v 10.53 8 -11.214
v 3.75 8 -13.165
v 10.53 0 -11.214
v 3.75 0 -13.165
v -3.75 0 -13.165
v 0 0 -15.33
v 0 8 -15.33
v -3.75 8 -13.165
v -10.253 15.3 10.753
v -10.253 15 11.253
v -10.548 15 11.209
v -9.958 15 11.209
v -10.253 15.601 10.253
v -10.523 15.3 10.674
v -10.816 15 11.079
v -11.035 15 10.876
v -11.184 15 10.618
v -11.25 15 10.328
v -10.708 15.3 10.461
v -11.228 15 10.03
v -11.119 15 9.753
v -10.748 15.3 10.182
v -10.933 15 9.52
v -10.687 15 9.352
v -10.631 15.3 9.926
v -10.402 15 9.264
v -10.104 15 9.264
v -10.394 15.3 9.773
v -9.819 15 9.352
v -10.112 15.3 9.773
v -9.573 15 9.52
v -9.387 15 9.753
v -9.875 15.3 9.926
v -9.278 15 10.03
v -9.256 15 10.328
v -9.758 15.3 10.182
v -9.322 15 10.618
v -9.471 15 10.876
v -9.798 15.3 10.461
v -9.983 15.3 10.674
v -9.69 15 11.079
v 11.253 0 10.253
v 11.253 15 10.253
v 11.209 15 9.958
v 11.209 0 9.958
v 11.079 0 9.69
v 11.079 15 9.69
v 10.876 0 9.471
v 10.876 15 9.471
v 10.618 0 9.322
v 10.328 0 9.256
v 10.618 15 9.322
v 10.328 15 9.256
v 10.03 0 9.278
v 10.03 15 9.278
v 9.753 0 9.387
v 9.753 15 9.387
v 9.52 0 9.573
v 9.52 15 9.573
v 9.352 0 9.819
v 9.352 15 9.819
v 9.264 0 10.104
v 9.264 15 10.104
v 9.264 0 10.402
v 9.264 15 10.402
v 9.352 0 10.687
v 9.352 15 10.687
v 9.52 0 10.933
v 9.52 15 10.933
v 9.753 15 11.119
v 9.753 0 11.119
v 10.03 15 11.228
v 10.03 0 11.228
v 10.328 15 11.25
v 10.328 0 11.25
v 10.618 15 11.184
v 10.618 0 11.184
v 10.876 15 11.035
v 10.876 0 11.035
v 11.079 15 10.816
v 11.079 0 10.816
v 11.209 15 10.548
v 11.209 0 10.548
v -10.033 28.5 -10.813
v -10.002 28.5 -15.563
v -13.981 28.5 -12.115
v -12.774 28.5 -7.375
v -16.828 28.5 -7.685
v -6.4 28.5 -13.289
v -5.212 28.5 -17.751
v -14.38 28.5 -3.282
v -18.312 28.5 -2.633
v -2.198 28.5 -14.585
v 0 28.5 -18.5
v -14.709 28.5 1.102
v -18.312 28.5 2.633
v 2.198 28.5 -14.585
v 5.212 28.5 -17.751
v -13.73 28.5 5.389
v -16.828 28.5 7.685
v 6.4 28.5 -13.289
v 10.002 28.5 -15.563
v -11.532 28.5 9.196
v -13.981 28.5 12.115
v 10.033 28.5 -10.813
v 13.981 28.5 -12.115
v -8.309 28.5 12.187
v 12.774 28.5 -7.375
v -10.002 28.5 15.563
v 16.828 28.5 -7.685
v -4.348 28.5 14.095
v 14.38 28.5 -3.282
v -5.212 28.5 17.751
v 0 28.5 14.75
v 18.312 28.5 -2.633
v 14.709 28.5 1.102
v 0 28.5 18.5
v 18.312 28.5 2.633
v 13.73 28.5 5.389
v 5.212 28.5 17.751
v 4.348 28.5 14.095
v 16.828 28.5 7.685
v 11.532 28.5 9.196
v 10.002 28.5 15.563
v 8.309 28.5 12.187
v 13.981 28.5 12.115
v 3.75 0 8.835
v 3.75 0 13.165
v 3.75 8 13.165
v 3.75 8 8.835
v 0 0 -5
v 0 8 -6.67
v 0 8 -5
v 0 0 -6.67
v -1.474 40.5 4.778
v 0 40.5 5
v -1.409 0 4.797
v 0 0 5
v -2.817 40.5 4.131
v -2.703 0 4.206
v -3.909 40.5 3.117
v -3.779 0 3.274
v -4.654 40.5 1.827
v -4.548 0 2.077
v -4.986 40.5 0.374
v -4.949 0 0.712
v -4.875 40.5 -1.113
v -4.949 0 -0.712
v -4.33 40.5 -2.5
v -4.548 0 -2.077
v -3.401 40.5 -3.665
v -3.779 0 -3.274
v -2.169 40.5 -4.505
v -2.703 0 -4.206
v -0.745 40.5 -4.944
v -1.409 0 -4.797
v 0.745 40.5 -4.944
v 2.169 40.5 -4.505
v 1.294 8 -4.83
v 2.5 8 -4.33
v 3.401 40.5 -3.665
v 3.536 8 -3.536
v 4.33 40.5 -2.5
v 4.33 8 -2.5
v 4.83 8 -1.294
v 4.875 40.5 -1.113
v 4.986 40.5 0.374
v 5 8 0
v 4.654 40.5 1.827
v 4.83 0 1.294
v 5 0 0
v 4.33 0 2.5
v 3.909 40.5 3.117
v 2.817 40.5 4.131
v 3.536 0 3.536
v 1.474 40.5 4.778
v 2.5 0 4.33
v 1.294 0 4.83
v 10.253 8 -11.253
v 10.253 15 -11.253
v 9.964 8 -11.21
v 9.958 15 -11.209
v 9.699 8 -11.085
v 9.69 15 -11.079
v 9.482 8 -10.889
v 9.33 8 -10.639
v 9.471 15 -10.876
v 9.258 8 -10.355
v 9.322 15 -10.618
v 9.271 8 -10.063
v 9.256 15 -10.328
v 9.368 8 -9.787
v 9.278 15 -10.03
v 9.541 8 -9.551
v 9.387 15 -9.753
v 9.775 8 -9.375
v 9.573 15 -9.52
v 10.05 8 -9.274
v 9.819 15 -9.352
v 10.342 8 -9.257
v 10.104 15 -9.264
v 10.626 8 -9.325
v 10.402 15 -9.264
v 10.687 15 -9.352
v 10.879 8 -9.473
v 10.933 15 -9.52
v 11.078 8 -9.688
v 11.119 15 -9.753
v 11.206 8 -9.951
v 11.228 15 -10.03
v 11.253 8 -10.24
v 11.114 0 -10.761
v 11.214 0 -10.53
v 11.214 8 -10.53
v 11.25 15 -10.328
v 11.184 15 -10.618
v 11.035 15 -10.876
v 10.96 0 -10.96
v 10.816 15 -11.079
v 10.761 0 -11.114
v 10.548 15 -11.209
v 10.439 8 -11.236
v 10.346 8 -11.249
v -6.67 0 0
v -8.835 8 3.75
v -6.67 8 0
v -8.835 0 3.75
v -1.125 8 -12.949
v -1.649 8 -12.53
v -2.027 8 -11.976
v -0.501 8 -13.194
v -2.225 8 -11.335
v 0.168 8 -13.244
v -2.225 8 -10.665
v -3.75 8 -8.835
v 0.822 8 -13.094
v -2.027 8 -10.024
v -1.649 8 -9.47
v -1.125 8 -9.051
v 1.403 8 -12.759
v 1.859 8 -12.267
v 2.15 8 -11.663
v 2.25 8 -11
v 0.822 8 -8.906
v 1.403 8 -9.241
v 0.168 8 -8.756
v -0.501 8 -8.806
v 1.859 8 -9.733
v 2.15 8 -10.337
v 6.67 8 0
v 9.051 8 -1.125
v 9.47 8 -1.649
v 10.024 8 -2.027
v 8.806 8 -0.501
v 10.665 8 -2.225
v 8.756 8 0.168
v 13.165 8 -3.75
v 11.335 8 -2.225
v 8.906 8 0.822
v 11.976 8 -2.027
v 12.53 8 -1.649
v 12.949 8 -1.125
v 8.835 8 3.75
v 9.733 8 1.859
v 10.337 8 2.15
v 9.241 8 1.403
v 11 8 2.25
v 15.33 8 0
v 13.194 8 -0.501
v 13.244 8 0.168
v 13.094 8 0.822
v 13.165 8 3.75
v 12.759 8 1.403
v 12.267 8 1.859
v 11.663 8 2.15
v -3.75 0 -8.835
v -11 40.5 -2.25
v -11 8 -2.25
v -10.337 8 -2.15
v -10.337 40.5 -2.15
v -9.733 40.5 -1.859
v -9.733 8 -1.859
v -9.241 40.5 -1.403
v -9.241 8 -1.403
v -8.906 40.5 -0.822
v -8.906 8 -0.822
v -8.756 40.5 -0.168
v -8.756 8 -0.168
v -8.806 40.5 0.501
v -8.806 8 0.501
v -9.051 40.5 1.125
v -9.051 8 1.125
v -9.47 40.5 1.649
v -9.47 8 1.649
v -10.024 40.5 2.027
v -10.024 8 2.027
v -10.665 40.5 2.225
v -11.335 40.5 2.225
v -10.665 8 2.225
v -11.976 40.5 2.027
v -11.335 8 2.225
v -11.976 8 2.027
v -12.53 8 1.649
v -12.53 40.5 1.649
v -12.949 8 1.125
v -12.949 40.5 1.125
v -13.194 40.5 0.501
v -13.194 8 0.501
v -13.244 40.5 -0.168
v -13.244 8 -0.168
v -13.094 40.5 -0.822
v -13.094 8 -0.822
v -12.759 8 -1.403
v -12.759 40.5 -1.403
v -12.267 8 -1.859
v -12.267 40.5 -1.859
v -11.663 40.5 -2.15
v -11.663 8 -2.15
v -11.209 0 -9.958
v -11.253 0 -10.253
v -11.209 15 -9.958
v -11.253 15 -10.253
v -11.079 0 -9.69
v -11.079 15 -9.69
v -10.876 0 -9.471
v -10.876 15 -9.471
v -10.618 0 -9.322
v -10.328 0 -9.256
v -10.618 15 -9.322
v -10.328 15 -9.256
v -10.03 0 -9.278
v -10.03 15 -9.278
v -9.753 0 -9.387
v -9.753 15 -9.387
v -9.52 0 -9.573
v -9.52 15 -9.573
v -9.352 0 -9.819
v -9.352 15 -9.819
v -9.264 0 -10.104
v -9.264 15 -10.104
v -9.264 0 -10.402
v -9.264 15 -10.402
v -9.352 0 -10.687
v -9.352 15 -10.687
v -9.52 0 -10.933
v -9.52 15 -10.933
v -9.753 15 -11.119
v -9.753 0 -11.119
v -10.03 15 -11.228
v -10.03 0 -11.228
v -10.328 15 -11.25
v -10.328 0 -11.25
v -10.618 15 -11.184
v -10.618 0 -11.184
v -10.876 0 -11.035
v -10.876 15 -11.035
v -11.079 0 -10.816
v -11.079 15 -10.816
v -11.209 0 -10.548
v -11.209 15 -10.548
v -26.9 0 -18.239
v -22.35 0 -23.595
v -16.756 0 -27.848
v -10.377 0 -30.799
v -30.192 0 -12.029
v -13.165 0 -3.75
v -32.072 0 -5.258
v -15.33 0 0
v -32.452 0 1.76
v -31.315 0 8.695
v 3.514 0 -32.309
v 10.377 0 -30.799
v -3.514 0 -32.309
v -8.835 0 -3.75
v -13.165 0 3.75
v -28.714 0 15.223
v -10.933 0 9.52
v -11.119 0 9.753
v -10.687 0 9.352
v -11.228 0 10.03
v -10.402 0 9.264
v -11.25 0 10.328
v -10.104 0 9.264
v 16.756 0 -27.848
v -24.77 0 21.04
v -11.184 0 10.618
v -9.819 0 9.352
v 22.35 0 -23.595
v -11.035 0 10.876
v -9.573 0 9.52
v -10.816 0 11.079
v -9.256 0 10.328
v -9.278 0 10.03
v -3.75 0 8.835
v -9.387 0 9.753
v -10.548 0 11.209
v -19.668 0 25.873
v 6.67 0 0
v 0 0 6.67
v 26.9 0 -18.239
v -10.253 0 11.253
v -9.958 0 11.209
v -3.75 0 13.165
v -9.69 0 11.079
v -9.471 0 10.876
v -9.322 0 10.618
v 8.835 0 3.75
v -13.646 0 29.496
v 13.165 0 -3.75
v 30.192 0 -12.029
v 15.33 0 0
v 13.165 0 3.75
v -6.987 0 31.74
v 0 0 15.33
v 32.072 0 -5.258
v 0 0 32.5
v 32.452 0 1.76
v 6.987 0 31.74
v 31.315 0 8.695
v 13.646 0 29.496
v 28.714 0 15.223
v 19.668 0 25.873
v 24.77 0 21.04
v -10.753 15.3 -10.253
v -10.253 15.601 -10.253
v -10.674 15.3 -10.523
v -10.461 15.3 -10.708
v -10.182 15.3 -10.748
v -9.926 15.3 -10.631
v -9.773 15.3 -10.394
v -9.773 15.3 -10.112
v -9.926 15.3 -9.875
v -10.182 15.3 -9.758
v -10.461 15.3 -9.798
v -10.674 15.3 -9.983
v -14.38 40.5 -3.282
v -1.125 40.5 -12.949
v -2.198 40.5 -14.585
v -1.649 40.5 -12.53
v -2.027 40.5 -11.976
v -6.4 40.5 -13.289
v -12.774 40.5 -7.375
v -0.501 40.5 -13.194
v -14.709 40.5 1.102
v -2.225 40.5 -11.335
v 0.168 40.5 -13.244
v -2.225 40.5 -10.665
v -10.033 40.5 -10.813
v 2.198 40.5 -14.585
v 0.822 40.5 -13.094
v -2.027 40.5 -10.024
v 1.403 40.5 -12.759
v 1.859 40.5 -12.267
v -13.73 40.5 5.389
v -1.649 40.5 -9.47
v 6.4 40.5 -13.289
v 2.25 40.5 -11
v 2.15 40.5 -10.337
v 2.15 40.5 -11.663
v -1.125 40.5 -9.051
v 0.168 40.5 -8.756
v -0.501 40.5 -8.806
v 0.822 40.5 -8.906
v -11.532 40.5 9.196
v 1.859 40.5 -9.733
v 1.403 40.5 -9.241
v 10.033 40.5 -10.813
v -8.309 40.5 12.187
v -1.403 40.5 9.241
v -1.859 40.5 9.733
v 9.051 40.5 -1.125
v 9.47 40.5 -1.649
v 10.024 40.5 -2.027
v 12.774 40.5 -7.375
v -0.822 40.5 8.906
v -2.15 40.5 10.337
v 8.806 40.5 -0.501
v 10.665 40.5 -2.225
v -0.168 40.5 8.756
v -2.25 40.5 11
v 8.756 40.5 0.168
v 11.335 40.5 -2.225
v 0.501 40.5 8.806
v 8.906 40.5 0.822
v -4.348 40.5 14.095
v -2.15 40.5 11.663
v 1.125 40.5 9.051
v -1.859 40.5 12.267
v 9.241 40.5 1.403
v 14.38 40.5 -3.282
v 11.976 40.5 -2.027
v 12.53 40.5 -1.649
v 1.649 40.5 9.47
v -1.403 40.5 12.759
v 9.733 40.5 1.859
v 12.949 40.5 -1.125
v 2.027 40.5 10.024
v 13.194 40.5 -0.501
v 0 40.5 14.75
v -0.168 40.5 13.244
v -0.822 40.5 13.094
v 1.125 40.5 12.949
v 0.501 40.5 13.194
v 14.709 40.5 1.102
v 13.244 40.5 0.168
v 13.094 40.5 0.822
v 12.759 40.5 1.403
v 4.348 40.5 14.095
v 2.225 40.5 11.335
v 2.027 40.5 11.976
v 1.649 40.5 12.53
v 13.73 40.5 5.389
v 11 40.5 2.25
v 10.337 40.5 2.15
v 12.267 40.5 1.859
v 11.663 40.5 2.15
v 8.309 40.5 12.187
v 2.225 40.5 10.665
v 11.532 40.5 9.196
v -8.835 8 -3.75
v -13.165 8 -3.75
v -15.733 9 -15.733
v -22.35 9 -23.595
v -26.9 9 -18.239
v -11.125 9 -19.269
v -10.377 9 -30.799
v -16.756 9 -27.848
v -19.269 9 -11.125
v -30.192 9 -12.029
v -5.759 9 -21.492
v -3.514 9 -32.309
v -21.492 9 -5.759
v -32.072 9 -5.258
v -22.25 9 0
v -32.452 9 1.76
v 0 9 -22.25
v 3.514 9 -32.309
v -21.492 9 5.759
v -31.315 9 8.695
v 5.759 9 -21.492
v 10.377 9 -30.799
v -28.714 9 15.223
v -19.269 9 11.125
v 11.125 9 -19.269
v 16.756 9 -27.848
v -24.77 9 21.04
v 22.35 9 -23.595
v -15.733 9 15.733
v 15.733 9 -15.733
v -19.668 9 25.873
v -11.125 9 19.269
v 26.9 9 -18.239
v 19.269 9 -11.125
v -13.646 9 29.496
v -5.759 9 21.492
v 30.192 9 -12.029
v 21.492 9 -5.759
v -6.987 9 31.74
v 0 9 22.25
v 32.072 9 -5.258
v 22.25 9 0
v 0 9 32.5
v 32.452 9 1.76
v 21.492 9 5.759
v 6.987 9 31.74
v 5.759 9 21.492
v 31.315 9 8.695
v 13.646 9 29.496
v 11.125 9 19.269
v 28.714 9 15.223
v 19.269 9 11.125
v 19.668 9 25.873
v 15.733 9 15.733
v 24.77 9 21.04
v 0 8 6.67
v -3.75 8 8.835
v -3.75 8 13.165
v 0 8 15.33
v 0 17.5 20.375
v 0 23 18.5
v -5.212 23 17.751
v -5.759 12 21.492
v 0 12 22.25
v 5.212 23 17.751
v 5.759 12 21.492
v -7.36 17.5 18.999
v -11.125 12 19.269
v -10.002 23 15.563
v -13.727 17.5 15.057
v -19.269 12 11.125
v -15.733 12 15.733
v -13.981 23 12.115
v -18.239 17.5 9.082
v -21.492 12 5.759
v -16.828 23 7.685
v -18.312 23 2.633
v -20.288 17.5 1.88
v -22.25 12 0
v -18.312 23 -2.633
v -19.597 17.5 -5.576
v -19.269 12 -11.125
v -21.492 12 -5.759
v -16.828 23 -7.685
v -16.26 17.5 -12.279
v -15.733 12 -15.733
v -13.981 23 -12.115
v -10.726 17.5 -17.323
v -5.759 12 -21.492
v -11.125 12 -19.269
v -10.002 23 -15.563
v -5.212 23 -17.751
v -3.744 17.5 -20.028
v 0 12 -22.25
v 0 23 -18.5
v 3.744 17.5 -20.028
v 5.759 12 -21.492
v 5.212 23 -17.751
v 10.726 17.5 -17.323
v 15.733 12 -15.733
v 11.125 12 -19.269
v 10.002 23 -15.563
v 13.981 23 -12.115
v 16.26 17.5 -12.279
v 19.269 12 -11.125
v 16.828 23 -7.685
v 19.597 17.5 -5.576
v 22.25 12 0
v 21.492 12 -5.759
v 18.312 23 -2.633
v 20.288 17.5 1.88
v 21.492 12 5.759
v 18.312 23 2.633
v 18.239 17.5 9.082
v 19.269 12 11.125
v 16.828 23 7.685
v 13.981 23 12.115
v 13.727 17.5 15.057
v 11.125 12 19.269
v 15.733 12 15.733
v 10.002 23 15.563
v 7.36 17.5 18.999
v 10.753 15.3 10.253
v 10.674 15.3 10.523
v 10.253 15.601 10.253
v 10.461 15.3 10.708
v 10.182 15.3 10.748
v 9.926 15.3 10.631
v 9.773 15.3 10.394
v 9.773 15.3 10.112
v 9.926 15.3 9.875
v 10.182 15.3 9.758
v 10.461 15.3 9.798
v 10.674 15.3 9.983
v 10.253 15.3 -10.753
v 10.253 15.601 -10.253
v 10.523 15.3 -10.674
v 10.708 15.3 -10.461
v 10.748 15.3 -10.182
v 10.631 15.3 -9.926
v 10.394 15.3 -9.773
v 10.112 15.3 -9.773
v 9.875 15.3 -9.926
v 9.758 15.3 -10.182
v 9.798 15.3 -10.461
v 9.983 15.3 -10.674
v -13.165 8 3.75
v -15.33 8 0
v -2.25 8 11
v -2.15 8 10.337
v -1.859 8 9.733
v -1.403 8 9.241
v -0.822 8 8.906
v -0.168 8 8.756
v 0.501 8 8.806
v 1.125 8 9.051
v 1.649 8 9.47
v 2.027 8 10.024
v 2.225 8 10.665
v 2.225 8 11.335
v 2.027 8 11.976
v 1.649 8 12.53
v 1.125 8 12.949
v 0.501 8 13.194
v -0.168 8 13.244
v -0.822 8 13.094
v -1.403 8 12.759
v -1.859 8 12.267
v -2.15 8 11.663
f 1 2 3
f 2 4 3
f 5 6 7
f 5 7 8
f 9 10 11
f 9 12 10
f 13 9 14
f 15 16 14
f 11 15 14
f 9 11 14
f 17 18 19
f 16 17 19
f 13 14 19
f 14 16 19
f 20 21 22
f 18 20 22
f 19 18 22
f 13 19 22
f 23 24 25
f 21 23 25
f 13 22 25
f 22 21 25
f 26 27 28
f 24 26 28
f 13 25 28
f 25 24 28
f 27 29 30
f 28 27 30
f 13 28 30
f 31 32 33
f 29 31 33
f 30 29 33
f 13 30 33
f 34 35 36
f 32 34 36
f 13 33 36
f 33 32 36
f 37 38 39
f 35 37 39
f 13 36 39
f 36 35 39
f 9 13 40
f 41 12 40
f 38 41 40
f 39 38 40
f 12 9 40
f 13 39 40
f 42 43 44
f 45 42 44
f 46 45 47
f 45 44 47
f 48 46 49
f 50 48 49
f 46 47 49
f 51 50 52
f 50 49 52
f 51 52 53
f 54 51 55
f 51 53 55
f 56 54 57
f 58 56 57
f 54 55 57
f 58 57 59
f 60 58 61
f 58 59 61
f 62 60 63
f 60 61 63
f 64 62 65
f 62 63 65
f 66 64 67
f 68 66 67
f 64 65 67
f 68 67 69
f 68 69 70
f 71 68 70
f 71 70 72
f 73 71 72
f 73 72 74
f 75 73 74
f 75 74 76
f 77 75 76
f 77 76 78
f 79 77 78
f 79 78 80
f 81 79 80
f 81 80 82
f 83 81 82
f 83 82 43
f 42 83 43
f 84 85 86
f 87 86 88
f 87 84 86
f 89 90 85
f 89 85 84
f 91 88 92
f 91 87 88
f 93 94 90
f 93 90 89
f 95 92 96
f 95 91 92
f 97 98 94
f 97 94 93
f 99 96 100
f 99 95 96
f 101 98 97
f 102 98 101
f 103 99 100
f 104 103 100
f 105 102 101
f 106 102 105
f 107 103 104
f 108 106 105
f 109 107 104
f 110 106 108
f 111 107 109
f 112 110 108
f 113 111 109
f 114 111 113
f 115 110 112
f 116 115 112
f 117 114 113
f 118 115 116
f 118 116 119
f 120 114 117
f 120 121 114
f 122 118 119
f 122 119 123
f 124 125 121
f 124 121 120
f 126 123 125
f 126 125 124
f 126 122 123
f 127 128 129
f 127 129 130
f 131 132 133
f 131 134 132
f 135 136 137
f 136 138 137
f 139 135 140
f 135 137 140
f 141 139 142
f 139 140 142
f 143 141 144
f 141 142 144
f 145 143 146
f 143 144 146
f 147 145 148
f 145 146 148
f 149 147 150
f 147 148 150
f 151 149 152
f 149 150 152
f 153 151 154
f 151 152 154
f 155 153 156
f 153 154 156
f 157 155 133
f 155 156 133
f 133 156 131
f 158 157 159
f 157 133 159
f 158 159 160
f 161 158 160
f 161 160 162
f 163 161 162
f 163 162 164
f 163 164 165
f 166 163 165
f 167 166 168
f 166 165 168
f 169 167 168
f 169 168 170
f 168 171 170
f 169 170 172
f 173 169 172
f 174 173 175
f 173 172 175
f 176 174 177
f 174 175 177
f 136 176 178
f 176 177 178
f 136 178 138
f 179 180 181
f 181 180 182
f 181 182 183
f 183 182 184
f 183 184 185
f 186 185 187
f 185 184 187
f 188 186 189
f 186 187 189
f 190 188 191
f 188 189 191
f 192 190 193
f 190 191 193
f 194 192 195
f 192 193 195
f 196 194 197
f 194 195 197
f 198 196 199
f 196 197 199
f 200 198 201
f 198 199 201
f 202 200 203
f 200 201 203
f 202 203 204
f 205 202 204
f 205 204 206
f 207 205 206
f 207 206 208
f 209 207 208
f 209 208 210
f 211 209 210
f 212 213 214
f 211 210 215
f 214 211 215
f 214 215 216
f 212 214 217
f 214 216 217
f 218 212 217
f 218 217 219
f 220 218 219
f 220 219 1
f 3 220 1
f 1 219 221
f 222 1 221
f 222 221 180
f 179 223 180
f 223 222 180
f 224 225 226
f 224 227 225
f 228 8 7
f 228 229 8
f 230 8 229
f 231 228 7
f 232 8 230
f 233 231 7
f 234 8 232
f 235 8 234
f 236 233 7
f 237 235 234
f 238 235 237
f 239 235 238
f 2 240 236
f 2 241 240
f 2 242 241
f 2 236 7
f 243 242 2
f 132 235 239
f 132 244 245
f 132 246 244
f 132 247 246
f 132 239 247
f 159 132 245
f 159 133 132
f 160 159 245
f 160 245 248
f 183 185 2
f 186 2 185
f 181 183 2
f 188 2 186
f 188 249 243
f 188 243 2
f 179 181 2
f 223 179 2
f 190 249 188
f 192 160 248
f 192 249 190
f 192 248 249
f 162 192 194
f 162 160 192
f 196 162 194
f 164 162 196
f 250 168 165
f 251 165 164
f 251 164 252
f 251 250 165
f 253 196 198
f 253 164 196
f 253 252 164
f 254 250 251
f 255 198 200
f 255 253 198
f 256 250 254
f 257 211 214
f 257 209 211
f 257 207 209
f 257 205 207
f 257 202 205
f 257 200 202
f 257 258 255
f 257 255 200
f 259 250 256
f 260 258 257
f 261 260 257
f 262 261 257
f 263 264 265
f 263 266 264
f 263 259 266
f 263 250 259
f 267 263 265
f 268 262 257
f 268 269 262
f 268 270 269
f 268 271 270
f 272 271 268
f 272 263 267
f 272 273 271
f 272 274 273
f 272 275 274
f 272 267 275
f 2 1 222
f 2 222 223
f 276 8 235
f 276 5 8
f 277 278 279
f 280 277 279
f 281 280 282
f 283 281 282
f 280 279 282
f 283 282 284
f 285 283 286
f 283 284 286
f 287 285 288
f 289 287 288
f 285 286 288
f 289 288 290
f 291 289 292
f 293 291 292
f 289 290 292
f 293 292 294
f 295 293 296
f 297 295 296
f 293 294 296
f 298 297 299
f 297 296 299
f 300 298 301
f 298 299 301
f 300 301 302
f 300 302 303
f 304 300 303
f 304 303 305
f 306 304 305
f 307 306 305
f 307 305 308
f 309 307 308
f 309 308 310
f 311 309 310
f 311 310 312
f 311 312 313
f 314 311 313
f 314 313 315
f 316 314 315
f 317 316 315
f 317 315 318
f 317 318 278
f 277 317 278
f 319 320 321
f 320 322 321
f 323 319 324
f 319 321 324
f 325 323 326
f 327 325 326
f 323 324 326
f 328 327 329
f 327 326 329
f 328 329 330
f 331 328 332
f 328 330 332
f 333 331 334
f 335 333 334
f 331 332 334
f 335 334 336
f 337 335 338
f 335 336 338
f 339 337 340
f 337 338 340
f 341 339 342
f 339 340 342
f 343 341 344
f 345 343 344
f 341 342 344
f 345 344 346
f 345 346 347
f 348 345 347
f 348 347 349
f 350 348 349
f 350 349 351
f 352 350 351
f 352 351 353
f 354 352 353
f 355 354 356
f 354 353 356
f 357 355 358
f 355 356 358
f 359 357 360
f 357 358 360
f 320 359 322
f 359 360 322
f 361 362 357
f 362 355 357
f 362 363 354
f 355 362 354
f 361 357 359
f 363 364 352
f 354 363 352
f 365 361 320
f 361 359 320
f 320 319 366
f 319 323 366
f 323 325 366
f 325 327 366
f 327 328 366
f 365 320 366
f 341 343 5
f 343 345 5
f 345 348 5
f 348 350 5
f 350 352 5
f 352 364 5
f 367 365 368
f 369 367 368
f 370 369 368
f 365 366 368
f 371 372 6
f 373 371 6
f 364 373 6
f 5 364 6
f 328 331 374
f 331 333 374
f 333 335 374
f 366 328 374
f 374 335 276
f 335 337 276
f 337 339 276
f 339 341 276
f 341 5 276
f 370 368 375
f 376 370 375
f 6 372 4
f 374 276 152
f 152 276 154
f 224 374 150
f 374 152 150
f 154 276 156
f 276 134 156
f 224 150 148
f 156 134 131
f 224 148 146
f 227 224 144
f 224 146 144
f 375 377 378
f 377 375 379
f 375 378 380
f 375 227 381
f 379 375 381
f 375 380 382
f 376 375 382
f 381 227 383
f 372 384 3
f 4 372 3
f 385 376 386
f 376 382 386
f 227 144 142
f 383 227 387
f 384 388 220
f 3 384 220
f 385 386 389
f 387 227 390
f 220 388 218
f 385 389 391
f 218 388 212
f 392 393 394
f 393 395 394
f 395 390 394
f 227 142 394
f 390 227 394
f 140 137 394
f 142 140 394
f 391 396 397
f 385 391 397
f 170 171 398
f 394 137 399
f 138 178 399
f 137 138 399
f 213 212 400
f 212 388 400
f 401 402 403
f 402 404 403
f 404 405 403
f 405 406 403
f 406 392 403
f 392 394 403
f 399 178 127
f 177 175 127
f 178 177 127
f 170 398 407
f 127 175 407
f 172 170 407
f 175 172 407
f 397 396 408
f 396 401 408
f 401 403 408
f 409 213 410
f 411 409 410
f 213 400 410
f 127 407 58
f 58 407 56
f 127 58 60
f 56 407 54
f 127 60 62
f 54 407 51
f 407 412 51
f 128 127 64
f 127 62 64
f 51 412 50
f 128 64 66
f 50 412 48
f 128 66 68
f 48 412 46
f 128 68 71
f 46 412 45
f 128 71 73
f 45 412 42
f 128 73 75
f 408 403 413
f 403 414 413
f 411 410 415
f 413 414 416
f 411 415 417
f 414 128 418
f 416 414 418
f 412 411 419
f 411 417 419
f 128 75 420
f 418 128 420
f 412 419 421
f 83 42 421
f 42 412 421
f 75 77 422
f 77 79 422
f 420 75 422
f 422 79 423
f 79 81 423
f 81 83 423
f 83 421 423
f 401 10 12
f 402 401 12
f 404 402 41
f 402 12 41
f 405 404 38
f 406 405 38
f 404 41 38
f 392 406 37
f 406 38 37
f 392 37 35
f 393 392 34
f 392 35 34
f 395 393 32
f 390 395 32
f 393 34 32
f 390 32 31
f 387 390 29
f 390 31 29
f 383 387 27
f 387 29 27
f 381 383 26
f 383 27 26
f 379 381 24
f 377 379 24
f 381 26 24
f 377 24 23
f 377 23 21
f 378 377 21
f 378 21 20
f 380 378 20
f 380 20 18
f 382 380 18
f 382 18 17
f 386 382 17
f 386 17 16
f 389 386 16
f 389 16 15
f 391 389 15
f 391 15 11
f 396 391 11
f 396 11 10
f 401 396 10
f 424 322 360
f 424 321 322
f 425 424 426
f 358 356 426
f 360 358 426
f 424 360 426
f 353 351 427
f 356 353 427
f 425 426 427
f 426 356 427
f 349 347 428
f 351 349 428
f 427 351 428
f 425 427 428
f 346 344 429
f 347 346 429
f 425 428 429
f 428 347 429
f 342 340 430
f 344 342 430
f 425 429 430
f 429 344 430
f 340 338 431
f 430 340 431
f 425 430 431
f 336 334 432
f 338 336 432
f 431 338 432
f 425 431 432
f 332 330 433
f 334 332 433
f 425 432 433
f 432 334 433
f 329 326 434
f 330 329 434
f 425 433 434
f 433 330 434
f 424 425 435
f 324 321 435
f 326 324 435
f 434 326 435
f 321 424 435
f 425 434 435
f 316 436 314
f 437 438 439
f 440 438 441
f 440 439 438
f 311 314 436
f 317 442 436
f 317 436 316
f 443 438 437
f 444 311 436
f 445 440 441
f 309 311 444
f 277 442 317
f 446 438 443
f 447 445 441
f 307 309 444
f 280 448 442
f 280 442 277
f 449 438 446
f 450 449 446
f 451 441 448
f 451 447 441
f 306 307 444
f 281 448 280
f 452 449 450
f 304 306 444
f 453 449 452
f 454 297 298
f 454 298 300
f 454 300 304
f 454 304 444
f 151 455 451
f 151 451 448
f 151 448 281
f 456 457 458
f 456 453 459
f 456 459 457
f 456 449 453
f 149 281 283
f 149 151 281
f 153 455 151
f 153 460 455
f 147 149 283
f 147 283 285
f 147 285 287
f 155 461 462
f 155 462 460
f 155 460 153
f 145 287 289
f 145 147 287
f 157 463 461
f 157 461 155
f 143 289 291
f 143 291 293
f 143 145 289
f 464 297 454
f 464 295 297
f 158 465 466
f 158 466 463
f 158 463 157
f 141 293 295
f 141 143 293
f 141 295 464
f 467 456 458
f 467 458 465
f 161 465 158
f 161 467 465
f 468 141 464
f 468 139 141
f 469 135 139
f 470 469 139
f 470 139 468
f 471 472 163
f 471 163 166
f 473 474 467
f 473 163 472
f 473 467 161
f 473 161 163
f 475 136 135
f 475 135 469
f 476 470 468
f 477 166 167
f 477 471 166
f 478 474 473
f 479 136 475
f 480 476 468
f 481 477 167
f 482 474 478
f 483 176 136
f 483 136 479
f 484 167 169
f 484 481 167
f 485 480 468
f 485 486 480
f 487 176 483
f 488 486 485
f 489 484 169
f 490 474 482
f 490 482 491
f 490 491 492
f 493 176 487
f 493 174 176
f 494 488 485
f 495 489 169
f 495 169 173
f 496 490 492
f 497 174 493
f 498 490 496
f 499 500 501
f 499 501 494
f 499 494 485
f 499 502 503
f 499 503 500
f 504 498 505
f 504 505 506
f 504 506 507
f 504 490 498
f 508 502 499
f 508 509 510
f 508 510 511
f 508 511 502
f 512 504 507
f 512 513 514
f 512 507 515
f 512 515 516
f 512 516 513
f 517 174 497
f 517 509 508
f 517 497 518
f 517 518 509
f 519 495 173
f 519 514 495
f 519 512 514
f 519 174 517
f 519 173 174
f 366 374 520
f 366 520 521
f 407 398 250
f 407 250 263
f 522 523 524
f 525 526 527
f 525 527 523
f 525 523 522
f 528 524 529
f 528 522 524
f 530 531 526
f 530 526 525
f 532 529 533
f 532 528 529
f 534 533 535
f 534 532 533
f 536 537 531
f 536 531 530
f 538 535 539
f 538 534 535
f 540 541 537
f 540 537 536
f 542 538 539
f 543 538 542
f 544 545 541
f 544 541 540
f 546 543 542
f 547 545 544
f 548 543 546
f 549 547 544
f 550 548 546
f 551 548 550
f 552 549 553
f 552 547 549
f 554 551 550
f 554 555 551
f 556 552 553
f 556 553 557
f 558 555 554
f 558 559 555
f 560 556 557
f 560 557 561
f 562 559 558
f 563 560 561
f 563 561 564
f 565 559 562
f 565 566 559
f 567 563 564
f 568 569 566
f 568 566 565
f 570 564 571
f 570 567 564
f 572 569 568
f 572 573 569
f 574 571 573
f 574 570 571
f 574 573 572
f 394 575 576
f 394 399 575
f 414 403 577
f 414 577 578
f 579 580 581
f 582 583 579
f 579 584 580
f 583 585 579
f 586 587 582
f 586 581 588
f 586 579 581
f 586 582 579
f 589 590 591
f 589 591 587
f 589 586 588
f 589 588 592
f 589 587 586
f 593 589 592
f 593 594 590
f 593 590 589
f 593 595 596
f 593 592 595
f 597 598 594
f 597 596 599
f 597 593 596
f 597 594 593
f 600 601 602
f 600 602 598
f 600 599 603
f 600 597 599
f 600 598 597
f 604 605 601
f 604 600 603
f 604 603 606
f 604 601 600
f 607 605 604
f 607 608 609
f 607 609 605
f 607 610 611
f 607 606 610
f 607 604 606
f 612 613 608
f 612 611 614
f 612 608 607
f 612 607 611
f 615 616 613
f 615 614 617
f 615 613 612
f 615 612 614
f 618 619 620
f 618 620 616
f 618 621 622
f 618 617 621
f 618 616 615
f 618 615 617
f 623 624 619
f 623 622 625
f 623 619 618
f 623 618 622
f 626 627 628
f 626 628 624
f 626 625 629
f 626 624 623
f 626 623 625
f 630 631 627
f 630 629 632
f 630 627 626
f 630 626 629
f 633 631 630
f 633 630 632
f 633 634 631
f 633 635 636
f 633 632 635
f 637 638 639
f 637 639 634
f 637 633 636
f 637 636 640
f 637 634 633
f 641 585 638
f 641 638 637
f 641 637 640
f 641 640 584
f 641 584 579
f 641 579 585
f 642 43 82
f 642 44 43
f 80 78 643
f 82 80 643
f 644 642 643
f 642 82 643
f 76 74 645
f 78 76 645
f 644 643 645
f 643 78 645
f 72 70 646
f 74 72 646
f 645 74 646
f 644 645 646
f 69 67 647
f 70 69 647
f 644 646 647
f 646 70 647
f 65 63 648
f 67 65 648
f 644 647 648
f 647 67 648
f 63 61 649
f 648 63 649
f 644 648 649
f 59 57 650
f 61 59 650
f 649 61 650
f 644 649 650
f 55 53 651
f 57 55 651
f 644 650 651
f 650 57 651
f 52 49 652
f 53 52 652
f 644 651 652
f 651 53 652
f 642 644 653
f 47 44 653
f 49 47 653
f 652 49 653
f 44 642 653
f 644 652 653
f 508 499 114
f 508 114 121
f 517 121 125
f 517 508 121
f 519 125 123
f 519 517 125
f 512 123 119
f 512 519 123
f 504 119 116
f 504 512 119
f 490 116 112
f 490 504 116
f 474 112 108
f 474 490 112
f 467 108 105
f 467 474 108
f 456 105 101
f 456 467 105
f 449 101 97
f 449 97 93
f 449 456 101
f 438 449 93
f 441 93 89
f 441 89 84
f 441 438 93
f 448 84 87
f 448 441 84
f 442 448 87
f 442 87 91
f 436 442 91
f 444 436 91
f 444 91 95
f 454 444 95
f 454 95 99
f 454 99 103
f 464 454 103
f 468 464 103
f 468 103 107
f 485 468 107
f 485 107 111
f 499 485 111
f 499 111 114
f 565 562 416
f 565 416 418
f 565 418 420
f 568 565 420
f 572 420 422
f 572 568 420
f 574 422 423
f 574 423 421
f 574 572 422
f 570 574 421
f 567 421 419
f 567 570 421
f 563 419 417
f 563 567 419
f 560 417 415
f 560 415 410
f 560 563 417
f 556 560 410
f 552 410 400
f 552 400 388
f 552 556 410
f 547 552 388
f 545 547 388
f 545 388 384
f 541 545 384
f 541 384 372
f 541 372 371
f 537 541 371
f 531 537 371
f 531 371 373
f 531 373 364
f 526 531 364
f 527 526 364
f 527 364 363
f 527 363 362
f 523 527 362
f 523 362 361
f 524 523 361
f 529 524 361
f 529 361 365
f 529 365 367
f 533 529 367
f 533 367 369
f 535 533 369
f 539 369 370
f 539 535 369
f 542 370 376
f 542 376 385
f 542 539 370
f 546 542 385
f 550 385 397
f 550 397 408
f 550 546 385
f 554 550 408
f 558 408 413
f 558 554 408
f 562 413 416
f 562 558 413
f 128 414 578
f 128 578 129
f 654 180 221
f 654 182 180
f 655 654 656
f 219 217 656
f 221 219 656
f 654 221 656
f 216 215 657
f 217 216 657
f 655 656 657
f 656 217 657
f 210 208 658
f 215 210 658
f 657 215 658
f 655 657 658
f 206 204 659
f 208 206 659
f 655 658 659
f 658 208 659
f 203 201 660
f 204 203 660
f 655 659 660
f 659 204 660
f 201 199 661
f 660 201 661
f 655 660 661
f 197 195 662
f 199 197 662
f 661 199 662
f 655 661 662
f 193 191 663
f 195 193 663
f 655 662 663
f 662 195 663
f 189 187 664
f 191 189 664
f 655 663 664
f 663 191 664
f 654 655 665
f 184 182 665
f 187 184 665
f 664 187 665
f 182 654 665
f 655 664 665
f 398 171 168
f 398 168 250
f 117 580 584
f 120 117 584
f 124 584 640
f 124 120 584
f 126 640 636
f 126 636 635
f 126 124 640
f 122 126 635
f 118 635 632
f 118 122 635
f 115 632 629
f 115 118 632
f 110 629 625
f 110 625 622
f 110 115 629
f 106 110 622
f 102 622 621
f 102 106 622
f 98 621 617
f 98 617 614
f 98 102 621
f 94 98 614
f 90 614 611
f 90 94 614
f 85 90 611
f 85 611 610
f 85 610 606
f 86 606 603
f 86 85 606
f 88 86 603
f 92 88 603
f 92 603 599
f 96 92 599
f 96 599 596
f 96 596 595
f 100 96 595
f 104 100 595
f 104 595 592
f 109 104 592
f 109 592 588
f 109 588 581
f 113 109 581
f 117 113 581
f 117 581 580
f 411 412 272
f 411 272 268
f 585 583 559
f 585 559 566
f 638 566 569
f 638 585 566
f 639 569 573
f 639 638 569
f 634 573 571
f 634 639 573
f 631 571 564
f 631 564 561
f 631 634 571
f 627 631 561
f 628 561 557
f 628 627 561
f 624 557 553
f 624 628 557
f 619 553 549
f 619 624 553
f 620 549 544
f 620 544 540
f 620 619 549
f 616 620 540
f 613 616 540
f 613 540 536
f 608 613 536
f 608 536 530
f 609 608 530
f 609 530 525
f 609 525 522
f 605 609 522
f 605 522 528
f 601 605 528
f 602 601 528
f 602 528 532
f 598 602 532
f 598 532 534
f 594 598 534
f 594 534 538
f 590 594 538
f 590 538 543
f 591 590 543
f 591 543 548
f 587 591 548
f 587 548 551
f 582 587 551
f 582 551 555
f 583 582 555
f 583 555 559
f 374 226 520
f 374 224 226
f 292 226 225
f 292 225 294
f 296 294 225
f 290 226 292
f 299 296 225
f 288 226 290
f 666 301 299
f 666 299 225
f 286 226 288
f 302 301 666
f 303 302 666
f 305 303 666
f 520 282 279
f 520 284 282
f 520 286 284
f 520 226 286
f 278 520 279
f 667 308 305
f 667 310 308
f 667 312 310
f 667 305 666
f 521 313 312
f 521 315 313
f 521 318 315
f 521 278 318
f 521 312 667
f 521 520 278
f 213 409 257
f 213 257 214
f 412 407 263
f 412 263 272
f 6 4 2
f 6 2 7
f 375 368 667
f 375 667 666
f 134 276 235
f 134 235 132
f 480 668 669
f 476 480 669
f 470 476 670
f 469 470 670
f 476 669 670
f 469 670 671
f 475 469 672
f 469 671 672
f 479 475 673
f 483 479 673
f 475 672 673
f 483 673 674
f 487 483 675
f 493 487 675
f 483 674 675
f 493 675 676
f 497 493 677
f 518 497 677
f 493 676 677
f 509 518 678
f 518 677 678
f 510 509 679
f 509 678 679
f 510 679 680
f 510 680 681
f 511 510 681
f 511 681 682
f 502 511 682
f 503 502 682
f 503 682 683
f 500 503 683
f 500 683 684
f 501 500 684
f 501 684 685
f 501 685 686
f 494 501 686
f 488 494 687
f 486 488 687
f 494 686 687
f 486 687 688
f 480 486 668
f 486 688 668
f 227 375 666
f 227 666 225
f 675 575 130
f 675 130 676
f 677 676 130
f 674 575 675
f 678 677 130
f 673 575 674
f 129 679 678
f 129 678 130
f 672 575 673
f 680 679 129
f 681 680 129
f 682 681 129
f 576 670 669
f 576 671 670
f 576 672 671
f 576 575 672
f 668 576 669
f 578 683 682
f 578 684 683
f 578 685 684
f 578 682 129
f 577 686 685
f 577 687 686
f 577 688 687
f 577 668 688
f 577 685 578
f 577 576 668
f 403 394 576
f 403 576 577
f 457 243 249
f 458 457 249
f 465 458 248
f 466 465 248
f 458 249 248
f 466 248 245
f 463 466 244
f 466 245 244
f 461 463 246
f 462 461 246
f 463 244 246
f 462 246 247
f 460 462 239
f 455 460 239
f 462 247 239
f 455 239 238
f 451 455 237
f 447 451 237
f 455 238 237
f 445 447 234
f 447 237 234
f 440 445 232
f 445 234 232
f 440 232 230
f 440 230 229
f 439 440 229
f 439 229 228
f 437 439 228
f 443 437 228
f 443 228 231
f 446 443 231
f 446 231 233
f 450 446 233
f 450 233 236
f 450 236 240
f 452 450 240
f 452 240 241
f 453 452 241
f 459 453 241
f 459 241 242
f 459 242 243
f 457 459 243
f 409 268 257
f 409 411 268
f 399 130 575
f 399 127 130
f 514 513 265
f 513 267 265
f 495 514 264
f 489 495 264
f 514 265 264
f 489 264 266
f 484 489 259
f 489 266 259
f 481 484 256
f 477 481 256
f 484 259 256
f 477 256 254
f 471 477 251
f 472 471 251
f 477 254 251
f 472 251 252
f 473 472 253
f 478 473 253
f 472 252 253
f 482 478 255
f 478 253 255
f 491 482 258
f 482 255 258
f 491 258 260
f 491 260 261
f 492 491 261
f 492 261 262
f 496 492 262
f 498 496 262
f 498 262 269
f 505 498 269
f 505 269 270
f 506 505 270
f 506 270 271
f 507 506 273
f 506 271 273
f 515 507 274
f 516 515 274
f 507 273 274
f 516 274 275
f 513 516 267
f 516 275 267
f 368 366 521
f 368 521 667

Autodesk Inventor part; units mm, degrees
ref_plane "YZ Plane" through (0, 0, 0) normal (1, 0, 0) x (0, 1, 0)
ref_plane "XZ Plane" through (0, 0, 0) normal (0, 1, 0) x (-1, 0, 0)
ref_plane "XY Plane" through (0, 0, 0) normal (0, 0, 1) x (1, 0, 0)
sketch "Sketch1" plane through (0, 0, 0) normal (1, 0, 0) x (0, 1, 0)
  line L0 (0, 0) -> (0, 32.5)
  line L1 (0, 0) -> (40.5, 0)
  line L2 (23, 18.5) -> (28.5, 18.5)
  line L3 (28.5, 18.5) -> (28.5, 14.75)
  line L4 (28.5, 14.75) -> (40.5, 14.75)
  line L5 (40.5, 14.75) -> (40.5, 0)
  line L6 (0, 32.5) -> (9, 32.5)
  line L7 (9, 32.5) -> (9, 22.25)
  line L8 (9, 22.25) -> (12, 22.25)
  line L9 (12, 22.25) -> (23, 18.5)
  dimension "d0" = 32.5
  dimension "d1" = 12
  dimension "d2" = 14.75
  dimension "d4" = 18.5
  dimension "d5" = 5.5
  dimension "d6" = 14
  dimension "d7" = 3
  dimension "d8" = 9
  dimension "d9" = 22.25
revolve "Revolution1" add sketch "Sketch1" angle 360 about axis through (0, 0, 0) along (0, 1, 0)
sketch "Sketch2" plane through (0, 40.5, 0) normal (0, 1, 0) x (1, 0, 0)
  circle A0 centre (0, 0) radius 14.75 projected
  line L0 (0, 0) -> (11, 0) construction
  dimension "d11" = 11
hole "Hole1" at (11, 40.5, 0) direction (0, -1, 0) diameter 4.5 end through all
hole "Hole2" at (0, 40.5, 0) direction (0, -1, 0) diameter 10 end through all
sketch "Sketch3" plane through (0, 0, 0) normal (0, -1, 0) x (1, 0, 0)
  line L0 (15.3301, 0) -> (13.1651, -3.75)
  line L1 (13.1651, -3.75) -> (8.8349, -3.75)
  line L2 (8.8349, -3.75) -> (6.6699, 0)
  line L3 (6.6699, 0) -> (8.8349, 3.75)
  line L4 (8.8349, 3.75) -> (13.1651, 3.75)
  line L5 (13.1651, 3.75) -> (15.3301, 0)
  circle A0 centre (11, 0) radius 2.25 projected
  circle A1 centre (0, 0) radius 32.5 projected
  line L6 (11, 0) -> (0, 0) construction
  line L7 (0, 0) -> (10.253, -10.253) construction
  point P0 (11, 0)
  dimension "d31" = 7.5
  dimension "d37" = 14.5
  dimension "d38" = 45
extrude "Extrusion1" cut sketch "Sketch3" against normal blind 8 contours L0 L1 L2 L3 L4 L5 | A0
hole "Hole3" at (10.253, 0, -10.253) direction (0, 1, 0) diameter 2 depth 15 tip angle 118
pattern_circular "Circular Pattern2" count 4 over 360 about axis through (0, -10, 0) along (0, 1, 0) of "Extrusion1", "Hole1", "Hole3"
sketch "Sketch4" plane through (0, 0, 0) normal (0, -1, 0) x (1, 0, 0)
  line L0 (0, -6.6699) -> (3.75, -8.8349) projected
  line L1 (3.75, -8.8349) -> (3.75, -13.1651) projected
  circle A0 centre (10.253, -10.253) radius 1 projected
  line L2 (13.1651, -3.75) -> (8.8349, -3.75) projected
  line L3 (8.8349, -3.75) -> (6.6699, 0) projected
  line L4 (8.8349, 3.75) -> (13.1651, 3.75) projected
  circle A1 centre (0, 0) radius 32.5 projected
  line L5 (0, -6.6699) -> (0, 0)
  line L6 (0, 0) -> (6.6699, 0)
  line L7 (3.75, -13.1651) -> (10.5296, -11.214)
  line L8 (13.1651, -3.75) -> (11.214, -10.5296)
extrude "Extrusion2" cut sketch "Sketch4" against normal up to surface (8 mm away) contours L5 L6 L3 L2 L8 A0 L7 L1 L0
properties part number "stand_coupler1" material "ABS Plastic"
